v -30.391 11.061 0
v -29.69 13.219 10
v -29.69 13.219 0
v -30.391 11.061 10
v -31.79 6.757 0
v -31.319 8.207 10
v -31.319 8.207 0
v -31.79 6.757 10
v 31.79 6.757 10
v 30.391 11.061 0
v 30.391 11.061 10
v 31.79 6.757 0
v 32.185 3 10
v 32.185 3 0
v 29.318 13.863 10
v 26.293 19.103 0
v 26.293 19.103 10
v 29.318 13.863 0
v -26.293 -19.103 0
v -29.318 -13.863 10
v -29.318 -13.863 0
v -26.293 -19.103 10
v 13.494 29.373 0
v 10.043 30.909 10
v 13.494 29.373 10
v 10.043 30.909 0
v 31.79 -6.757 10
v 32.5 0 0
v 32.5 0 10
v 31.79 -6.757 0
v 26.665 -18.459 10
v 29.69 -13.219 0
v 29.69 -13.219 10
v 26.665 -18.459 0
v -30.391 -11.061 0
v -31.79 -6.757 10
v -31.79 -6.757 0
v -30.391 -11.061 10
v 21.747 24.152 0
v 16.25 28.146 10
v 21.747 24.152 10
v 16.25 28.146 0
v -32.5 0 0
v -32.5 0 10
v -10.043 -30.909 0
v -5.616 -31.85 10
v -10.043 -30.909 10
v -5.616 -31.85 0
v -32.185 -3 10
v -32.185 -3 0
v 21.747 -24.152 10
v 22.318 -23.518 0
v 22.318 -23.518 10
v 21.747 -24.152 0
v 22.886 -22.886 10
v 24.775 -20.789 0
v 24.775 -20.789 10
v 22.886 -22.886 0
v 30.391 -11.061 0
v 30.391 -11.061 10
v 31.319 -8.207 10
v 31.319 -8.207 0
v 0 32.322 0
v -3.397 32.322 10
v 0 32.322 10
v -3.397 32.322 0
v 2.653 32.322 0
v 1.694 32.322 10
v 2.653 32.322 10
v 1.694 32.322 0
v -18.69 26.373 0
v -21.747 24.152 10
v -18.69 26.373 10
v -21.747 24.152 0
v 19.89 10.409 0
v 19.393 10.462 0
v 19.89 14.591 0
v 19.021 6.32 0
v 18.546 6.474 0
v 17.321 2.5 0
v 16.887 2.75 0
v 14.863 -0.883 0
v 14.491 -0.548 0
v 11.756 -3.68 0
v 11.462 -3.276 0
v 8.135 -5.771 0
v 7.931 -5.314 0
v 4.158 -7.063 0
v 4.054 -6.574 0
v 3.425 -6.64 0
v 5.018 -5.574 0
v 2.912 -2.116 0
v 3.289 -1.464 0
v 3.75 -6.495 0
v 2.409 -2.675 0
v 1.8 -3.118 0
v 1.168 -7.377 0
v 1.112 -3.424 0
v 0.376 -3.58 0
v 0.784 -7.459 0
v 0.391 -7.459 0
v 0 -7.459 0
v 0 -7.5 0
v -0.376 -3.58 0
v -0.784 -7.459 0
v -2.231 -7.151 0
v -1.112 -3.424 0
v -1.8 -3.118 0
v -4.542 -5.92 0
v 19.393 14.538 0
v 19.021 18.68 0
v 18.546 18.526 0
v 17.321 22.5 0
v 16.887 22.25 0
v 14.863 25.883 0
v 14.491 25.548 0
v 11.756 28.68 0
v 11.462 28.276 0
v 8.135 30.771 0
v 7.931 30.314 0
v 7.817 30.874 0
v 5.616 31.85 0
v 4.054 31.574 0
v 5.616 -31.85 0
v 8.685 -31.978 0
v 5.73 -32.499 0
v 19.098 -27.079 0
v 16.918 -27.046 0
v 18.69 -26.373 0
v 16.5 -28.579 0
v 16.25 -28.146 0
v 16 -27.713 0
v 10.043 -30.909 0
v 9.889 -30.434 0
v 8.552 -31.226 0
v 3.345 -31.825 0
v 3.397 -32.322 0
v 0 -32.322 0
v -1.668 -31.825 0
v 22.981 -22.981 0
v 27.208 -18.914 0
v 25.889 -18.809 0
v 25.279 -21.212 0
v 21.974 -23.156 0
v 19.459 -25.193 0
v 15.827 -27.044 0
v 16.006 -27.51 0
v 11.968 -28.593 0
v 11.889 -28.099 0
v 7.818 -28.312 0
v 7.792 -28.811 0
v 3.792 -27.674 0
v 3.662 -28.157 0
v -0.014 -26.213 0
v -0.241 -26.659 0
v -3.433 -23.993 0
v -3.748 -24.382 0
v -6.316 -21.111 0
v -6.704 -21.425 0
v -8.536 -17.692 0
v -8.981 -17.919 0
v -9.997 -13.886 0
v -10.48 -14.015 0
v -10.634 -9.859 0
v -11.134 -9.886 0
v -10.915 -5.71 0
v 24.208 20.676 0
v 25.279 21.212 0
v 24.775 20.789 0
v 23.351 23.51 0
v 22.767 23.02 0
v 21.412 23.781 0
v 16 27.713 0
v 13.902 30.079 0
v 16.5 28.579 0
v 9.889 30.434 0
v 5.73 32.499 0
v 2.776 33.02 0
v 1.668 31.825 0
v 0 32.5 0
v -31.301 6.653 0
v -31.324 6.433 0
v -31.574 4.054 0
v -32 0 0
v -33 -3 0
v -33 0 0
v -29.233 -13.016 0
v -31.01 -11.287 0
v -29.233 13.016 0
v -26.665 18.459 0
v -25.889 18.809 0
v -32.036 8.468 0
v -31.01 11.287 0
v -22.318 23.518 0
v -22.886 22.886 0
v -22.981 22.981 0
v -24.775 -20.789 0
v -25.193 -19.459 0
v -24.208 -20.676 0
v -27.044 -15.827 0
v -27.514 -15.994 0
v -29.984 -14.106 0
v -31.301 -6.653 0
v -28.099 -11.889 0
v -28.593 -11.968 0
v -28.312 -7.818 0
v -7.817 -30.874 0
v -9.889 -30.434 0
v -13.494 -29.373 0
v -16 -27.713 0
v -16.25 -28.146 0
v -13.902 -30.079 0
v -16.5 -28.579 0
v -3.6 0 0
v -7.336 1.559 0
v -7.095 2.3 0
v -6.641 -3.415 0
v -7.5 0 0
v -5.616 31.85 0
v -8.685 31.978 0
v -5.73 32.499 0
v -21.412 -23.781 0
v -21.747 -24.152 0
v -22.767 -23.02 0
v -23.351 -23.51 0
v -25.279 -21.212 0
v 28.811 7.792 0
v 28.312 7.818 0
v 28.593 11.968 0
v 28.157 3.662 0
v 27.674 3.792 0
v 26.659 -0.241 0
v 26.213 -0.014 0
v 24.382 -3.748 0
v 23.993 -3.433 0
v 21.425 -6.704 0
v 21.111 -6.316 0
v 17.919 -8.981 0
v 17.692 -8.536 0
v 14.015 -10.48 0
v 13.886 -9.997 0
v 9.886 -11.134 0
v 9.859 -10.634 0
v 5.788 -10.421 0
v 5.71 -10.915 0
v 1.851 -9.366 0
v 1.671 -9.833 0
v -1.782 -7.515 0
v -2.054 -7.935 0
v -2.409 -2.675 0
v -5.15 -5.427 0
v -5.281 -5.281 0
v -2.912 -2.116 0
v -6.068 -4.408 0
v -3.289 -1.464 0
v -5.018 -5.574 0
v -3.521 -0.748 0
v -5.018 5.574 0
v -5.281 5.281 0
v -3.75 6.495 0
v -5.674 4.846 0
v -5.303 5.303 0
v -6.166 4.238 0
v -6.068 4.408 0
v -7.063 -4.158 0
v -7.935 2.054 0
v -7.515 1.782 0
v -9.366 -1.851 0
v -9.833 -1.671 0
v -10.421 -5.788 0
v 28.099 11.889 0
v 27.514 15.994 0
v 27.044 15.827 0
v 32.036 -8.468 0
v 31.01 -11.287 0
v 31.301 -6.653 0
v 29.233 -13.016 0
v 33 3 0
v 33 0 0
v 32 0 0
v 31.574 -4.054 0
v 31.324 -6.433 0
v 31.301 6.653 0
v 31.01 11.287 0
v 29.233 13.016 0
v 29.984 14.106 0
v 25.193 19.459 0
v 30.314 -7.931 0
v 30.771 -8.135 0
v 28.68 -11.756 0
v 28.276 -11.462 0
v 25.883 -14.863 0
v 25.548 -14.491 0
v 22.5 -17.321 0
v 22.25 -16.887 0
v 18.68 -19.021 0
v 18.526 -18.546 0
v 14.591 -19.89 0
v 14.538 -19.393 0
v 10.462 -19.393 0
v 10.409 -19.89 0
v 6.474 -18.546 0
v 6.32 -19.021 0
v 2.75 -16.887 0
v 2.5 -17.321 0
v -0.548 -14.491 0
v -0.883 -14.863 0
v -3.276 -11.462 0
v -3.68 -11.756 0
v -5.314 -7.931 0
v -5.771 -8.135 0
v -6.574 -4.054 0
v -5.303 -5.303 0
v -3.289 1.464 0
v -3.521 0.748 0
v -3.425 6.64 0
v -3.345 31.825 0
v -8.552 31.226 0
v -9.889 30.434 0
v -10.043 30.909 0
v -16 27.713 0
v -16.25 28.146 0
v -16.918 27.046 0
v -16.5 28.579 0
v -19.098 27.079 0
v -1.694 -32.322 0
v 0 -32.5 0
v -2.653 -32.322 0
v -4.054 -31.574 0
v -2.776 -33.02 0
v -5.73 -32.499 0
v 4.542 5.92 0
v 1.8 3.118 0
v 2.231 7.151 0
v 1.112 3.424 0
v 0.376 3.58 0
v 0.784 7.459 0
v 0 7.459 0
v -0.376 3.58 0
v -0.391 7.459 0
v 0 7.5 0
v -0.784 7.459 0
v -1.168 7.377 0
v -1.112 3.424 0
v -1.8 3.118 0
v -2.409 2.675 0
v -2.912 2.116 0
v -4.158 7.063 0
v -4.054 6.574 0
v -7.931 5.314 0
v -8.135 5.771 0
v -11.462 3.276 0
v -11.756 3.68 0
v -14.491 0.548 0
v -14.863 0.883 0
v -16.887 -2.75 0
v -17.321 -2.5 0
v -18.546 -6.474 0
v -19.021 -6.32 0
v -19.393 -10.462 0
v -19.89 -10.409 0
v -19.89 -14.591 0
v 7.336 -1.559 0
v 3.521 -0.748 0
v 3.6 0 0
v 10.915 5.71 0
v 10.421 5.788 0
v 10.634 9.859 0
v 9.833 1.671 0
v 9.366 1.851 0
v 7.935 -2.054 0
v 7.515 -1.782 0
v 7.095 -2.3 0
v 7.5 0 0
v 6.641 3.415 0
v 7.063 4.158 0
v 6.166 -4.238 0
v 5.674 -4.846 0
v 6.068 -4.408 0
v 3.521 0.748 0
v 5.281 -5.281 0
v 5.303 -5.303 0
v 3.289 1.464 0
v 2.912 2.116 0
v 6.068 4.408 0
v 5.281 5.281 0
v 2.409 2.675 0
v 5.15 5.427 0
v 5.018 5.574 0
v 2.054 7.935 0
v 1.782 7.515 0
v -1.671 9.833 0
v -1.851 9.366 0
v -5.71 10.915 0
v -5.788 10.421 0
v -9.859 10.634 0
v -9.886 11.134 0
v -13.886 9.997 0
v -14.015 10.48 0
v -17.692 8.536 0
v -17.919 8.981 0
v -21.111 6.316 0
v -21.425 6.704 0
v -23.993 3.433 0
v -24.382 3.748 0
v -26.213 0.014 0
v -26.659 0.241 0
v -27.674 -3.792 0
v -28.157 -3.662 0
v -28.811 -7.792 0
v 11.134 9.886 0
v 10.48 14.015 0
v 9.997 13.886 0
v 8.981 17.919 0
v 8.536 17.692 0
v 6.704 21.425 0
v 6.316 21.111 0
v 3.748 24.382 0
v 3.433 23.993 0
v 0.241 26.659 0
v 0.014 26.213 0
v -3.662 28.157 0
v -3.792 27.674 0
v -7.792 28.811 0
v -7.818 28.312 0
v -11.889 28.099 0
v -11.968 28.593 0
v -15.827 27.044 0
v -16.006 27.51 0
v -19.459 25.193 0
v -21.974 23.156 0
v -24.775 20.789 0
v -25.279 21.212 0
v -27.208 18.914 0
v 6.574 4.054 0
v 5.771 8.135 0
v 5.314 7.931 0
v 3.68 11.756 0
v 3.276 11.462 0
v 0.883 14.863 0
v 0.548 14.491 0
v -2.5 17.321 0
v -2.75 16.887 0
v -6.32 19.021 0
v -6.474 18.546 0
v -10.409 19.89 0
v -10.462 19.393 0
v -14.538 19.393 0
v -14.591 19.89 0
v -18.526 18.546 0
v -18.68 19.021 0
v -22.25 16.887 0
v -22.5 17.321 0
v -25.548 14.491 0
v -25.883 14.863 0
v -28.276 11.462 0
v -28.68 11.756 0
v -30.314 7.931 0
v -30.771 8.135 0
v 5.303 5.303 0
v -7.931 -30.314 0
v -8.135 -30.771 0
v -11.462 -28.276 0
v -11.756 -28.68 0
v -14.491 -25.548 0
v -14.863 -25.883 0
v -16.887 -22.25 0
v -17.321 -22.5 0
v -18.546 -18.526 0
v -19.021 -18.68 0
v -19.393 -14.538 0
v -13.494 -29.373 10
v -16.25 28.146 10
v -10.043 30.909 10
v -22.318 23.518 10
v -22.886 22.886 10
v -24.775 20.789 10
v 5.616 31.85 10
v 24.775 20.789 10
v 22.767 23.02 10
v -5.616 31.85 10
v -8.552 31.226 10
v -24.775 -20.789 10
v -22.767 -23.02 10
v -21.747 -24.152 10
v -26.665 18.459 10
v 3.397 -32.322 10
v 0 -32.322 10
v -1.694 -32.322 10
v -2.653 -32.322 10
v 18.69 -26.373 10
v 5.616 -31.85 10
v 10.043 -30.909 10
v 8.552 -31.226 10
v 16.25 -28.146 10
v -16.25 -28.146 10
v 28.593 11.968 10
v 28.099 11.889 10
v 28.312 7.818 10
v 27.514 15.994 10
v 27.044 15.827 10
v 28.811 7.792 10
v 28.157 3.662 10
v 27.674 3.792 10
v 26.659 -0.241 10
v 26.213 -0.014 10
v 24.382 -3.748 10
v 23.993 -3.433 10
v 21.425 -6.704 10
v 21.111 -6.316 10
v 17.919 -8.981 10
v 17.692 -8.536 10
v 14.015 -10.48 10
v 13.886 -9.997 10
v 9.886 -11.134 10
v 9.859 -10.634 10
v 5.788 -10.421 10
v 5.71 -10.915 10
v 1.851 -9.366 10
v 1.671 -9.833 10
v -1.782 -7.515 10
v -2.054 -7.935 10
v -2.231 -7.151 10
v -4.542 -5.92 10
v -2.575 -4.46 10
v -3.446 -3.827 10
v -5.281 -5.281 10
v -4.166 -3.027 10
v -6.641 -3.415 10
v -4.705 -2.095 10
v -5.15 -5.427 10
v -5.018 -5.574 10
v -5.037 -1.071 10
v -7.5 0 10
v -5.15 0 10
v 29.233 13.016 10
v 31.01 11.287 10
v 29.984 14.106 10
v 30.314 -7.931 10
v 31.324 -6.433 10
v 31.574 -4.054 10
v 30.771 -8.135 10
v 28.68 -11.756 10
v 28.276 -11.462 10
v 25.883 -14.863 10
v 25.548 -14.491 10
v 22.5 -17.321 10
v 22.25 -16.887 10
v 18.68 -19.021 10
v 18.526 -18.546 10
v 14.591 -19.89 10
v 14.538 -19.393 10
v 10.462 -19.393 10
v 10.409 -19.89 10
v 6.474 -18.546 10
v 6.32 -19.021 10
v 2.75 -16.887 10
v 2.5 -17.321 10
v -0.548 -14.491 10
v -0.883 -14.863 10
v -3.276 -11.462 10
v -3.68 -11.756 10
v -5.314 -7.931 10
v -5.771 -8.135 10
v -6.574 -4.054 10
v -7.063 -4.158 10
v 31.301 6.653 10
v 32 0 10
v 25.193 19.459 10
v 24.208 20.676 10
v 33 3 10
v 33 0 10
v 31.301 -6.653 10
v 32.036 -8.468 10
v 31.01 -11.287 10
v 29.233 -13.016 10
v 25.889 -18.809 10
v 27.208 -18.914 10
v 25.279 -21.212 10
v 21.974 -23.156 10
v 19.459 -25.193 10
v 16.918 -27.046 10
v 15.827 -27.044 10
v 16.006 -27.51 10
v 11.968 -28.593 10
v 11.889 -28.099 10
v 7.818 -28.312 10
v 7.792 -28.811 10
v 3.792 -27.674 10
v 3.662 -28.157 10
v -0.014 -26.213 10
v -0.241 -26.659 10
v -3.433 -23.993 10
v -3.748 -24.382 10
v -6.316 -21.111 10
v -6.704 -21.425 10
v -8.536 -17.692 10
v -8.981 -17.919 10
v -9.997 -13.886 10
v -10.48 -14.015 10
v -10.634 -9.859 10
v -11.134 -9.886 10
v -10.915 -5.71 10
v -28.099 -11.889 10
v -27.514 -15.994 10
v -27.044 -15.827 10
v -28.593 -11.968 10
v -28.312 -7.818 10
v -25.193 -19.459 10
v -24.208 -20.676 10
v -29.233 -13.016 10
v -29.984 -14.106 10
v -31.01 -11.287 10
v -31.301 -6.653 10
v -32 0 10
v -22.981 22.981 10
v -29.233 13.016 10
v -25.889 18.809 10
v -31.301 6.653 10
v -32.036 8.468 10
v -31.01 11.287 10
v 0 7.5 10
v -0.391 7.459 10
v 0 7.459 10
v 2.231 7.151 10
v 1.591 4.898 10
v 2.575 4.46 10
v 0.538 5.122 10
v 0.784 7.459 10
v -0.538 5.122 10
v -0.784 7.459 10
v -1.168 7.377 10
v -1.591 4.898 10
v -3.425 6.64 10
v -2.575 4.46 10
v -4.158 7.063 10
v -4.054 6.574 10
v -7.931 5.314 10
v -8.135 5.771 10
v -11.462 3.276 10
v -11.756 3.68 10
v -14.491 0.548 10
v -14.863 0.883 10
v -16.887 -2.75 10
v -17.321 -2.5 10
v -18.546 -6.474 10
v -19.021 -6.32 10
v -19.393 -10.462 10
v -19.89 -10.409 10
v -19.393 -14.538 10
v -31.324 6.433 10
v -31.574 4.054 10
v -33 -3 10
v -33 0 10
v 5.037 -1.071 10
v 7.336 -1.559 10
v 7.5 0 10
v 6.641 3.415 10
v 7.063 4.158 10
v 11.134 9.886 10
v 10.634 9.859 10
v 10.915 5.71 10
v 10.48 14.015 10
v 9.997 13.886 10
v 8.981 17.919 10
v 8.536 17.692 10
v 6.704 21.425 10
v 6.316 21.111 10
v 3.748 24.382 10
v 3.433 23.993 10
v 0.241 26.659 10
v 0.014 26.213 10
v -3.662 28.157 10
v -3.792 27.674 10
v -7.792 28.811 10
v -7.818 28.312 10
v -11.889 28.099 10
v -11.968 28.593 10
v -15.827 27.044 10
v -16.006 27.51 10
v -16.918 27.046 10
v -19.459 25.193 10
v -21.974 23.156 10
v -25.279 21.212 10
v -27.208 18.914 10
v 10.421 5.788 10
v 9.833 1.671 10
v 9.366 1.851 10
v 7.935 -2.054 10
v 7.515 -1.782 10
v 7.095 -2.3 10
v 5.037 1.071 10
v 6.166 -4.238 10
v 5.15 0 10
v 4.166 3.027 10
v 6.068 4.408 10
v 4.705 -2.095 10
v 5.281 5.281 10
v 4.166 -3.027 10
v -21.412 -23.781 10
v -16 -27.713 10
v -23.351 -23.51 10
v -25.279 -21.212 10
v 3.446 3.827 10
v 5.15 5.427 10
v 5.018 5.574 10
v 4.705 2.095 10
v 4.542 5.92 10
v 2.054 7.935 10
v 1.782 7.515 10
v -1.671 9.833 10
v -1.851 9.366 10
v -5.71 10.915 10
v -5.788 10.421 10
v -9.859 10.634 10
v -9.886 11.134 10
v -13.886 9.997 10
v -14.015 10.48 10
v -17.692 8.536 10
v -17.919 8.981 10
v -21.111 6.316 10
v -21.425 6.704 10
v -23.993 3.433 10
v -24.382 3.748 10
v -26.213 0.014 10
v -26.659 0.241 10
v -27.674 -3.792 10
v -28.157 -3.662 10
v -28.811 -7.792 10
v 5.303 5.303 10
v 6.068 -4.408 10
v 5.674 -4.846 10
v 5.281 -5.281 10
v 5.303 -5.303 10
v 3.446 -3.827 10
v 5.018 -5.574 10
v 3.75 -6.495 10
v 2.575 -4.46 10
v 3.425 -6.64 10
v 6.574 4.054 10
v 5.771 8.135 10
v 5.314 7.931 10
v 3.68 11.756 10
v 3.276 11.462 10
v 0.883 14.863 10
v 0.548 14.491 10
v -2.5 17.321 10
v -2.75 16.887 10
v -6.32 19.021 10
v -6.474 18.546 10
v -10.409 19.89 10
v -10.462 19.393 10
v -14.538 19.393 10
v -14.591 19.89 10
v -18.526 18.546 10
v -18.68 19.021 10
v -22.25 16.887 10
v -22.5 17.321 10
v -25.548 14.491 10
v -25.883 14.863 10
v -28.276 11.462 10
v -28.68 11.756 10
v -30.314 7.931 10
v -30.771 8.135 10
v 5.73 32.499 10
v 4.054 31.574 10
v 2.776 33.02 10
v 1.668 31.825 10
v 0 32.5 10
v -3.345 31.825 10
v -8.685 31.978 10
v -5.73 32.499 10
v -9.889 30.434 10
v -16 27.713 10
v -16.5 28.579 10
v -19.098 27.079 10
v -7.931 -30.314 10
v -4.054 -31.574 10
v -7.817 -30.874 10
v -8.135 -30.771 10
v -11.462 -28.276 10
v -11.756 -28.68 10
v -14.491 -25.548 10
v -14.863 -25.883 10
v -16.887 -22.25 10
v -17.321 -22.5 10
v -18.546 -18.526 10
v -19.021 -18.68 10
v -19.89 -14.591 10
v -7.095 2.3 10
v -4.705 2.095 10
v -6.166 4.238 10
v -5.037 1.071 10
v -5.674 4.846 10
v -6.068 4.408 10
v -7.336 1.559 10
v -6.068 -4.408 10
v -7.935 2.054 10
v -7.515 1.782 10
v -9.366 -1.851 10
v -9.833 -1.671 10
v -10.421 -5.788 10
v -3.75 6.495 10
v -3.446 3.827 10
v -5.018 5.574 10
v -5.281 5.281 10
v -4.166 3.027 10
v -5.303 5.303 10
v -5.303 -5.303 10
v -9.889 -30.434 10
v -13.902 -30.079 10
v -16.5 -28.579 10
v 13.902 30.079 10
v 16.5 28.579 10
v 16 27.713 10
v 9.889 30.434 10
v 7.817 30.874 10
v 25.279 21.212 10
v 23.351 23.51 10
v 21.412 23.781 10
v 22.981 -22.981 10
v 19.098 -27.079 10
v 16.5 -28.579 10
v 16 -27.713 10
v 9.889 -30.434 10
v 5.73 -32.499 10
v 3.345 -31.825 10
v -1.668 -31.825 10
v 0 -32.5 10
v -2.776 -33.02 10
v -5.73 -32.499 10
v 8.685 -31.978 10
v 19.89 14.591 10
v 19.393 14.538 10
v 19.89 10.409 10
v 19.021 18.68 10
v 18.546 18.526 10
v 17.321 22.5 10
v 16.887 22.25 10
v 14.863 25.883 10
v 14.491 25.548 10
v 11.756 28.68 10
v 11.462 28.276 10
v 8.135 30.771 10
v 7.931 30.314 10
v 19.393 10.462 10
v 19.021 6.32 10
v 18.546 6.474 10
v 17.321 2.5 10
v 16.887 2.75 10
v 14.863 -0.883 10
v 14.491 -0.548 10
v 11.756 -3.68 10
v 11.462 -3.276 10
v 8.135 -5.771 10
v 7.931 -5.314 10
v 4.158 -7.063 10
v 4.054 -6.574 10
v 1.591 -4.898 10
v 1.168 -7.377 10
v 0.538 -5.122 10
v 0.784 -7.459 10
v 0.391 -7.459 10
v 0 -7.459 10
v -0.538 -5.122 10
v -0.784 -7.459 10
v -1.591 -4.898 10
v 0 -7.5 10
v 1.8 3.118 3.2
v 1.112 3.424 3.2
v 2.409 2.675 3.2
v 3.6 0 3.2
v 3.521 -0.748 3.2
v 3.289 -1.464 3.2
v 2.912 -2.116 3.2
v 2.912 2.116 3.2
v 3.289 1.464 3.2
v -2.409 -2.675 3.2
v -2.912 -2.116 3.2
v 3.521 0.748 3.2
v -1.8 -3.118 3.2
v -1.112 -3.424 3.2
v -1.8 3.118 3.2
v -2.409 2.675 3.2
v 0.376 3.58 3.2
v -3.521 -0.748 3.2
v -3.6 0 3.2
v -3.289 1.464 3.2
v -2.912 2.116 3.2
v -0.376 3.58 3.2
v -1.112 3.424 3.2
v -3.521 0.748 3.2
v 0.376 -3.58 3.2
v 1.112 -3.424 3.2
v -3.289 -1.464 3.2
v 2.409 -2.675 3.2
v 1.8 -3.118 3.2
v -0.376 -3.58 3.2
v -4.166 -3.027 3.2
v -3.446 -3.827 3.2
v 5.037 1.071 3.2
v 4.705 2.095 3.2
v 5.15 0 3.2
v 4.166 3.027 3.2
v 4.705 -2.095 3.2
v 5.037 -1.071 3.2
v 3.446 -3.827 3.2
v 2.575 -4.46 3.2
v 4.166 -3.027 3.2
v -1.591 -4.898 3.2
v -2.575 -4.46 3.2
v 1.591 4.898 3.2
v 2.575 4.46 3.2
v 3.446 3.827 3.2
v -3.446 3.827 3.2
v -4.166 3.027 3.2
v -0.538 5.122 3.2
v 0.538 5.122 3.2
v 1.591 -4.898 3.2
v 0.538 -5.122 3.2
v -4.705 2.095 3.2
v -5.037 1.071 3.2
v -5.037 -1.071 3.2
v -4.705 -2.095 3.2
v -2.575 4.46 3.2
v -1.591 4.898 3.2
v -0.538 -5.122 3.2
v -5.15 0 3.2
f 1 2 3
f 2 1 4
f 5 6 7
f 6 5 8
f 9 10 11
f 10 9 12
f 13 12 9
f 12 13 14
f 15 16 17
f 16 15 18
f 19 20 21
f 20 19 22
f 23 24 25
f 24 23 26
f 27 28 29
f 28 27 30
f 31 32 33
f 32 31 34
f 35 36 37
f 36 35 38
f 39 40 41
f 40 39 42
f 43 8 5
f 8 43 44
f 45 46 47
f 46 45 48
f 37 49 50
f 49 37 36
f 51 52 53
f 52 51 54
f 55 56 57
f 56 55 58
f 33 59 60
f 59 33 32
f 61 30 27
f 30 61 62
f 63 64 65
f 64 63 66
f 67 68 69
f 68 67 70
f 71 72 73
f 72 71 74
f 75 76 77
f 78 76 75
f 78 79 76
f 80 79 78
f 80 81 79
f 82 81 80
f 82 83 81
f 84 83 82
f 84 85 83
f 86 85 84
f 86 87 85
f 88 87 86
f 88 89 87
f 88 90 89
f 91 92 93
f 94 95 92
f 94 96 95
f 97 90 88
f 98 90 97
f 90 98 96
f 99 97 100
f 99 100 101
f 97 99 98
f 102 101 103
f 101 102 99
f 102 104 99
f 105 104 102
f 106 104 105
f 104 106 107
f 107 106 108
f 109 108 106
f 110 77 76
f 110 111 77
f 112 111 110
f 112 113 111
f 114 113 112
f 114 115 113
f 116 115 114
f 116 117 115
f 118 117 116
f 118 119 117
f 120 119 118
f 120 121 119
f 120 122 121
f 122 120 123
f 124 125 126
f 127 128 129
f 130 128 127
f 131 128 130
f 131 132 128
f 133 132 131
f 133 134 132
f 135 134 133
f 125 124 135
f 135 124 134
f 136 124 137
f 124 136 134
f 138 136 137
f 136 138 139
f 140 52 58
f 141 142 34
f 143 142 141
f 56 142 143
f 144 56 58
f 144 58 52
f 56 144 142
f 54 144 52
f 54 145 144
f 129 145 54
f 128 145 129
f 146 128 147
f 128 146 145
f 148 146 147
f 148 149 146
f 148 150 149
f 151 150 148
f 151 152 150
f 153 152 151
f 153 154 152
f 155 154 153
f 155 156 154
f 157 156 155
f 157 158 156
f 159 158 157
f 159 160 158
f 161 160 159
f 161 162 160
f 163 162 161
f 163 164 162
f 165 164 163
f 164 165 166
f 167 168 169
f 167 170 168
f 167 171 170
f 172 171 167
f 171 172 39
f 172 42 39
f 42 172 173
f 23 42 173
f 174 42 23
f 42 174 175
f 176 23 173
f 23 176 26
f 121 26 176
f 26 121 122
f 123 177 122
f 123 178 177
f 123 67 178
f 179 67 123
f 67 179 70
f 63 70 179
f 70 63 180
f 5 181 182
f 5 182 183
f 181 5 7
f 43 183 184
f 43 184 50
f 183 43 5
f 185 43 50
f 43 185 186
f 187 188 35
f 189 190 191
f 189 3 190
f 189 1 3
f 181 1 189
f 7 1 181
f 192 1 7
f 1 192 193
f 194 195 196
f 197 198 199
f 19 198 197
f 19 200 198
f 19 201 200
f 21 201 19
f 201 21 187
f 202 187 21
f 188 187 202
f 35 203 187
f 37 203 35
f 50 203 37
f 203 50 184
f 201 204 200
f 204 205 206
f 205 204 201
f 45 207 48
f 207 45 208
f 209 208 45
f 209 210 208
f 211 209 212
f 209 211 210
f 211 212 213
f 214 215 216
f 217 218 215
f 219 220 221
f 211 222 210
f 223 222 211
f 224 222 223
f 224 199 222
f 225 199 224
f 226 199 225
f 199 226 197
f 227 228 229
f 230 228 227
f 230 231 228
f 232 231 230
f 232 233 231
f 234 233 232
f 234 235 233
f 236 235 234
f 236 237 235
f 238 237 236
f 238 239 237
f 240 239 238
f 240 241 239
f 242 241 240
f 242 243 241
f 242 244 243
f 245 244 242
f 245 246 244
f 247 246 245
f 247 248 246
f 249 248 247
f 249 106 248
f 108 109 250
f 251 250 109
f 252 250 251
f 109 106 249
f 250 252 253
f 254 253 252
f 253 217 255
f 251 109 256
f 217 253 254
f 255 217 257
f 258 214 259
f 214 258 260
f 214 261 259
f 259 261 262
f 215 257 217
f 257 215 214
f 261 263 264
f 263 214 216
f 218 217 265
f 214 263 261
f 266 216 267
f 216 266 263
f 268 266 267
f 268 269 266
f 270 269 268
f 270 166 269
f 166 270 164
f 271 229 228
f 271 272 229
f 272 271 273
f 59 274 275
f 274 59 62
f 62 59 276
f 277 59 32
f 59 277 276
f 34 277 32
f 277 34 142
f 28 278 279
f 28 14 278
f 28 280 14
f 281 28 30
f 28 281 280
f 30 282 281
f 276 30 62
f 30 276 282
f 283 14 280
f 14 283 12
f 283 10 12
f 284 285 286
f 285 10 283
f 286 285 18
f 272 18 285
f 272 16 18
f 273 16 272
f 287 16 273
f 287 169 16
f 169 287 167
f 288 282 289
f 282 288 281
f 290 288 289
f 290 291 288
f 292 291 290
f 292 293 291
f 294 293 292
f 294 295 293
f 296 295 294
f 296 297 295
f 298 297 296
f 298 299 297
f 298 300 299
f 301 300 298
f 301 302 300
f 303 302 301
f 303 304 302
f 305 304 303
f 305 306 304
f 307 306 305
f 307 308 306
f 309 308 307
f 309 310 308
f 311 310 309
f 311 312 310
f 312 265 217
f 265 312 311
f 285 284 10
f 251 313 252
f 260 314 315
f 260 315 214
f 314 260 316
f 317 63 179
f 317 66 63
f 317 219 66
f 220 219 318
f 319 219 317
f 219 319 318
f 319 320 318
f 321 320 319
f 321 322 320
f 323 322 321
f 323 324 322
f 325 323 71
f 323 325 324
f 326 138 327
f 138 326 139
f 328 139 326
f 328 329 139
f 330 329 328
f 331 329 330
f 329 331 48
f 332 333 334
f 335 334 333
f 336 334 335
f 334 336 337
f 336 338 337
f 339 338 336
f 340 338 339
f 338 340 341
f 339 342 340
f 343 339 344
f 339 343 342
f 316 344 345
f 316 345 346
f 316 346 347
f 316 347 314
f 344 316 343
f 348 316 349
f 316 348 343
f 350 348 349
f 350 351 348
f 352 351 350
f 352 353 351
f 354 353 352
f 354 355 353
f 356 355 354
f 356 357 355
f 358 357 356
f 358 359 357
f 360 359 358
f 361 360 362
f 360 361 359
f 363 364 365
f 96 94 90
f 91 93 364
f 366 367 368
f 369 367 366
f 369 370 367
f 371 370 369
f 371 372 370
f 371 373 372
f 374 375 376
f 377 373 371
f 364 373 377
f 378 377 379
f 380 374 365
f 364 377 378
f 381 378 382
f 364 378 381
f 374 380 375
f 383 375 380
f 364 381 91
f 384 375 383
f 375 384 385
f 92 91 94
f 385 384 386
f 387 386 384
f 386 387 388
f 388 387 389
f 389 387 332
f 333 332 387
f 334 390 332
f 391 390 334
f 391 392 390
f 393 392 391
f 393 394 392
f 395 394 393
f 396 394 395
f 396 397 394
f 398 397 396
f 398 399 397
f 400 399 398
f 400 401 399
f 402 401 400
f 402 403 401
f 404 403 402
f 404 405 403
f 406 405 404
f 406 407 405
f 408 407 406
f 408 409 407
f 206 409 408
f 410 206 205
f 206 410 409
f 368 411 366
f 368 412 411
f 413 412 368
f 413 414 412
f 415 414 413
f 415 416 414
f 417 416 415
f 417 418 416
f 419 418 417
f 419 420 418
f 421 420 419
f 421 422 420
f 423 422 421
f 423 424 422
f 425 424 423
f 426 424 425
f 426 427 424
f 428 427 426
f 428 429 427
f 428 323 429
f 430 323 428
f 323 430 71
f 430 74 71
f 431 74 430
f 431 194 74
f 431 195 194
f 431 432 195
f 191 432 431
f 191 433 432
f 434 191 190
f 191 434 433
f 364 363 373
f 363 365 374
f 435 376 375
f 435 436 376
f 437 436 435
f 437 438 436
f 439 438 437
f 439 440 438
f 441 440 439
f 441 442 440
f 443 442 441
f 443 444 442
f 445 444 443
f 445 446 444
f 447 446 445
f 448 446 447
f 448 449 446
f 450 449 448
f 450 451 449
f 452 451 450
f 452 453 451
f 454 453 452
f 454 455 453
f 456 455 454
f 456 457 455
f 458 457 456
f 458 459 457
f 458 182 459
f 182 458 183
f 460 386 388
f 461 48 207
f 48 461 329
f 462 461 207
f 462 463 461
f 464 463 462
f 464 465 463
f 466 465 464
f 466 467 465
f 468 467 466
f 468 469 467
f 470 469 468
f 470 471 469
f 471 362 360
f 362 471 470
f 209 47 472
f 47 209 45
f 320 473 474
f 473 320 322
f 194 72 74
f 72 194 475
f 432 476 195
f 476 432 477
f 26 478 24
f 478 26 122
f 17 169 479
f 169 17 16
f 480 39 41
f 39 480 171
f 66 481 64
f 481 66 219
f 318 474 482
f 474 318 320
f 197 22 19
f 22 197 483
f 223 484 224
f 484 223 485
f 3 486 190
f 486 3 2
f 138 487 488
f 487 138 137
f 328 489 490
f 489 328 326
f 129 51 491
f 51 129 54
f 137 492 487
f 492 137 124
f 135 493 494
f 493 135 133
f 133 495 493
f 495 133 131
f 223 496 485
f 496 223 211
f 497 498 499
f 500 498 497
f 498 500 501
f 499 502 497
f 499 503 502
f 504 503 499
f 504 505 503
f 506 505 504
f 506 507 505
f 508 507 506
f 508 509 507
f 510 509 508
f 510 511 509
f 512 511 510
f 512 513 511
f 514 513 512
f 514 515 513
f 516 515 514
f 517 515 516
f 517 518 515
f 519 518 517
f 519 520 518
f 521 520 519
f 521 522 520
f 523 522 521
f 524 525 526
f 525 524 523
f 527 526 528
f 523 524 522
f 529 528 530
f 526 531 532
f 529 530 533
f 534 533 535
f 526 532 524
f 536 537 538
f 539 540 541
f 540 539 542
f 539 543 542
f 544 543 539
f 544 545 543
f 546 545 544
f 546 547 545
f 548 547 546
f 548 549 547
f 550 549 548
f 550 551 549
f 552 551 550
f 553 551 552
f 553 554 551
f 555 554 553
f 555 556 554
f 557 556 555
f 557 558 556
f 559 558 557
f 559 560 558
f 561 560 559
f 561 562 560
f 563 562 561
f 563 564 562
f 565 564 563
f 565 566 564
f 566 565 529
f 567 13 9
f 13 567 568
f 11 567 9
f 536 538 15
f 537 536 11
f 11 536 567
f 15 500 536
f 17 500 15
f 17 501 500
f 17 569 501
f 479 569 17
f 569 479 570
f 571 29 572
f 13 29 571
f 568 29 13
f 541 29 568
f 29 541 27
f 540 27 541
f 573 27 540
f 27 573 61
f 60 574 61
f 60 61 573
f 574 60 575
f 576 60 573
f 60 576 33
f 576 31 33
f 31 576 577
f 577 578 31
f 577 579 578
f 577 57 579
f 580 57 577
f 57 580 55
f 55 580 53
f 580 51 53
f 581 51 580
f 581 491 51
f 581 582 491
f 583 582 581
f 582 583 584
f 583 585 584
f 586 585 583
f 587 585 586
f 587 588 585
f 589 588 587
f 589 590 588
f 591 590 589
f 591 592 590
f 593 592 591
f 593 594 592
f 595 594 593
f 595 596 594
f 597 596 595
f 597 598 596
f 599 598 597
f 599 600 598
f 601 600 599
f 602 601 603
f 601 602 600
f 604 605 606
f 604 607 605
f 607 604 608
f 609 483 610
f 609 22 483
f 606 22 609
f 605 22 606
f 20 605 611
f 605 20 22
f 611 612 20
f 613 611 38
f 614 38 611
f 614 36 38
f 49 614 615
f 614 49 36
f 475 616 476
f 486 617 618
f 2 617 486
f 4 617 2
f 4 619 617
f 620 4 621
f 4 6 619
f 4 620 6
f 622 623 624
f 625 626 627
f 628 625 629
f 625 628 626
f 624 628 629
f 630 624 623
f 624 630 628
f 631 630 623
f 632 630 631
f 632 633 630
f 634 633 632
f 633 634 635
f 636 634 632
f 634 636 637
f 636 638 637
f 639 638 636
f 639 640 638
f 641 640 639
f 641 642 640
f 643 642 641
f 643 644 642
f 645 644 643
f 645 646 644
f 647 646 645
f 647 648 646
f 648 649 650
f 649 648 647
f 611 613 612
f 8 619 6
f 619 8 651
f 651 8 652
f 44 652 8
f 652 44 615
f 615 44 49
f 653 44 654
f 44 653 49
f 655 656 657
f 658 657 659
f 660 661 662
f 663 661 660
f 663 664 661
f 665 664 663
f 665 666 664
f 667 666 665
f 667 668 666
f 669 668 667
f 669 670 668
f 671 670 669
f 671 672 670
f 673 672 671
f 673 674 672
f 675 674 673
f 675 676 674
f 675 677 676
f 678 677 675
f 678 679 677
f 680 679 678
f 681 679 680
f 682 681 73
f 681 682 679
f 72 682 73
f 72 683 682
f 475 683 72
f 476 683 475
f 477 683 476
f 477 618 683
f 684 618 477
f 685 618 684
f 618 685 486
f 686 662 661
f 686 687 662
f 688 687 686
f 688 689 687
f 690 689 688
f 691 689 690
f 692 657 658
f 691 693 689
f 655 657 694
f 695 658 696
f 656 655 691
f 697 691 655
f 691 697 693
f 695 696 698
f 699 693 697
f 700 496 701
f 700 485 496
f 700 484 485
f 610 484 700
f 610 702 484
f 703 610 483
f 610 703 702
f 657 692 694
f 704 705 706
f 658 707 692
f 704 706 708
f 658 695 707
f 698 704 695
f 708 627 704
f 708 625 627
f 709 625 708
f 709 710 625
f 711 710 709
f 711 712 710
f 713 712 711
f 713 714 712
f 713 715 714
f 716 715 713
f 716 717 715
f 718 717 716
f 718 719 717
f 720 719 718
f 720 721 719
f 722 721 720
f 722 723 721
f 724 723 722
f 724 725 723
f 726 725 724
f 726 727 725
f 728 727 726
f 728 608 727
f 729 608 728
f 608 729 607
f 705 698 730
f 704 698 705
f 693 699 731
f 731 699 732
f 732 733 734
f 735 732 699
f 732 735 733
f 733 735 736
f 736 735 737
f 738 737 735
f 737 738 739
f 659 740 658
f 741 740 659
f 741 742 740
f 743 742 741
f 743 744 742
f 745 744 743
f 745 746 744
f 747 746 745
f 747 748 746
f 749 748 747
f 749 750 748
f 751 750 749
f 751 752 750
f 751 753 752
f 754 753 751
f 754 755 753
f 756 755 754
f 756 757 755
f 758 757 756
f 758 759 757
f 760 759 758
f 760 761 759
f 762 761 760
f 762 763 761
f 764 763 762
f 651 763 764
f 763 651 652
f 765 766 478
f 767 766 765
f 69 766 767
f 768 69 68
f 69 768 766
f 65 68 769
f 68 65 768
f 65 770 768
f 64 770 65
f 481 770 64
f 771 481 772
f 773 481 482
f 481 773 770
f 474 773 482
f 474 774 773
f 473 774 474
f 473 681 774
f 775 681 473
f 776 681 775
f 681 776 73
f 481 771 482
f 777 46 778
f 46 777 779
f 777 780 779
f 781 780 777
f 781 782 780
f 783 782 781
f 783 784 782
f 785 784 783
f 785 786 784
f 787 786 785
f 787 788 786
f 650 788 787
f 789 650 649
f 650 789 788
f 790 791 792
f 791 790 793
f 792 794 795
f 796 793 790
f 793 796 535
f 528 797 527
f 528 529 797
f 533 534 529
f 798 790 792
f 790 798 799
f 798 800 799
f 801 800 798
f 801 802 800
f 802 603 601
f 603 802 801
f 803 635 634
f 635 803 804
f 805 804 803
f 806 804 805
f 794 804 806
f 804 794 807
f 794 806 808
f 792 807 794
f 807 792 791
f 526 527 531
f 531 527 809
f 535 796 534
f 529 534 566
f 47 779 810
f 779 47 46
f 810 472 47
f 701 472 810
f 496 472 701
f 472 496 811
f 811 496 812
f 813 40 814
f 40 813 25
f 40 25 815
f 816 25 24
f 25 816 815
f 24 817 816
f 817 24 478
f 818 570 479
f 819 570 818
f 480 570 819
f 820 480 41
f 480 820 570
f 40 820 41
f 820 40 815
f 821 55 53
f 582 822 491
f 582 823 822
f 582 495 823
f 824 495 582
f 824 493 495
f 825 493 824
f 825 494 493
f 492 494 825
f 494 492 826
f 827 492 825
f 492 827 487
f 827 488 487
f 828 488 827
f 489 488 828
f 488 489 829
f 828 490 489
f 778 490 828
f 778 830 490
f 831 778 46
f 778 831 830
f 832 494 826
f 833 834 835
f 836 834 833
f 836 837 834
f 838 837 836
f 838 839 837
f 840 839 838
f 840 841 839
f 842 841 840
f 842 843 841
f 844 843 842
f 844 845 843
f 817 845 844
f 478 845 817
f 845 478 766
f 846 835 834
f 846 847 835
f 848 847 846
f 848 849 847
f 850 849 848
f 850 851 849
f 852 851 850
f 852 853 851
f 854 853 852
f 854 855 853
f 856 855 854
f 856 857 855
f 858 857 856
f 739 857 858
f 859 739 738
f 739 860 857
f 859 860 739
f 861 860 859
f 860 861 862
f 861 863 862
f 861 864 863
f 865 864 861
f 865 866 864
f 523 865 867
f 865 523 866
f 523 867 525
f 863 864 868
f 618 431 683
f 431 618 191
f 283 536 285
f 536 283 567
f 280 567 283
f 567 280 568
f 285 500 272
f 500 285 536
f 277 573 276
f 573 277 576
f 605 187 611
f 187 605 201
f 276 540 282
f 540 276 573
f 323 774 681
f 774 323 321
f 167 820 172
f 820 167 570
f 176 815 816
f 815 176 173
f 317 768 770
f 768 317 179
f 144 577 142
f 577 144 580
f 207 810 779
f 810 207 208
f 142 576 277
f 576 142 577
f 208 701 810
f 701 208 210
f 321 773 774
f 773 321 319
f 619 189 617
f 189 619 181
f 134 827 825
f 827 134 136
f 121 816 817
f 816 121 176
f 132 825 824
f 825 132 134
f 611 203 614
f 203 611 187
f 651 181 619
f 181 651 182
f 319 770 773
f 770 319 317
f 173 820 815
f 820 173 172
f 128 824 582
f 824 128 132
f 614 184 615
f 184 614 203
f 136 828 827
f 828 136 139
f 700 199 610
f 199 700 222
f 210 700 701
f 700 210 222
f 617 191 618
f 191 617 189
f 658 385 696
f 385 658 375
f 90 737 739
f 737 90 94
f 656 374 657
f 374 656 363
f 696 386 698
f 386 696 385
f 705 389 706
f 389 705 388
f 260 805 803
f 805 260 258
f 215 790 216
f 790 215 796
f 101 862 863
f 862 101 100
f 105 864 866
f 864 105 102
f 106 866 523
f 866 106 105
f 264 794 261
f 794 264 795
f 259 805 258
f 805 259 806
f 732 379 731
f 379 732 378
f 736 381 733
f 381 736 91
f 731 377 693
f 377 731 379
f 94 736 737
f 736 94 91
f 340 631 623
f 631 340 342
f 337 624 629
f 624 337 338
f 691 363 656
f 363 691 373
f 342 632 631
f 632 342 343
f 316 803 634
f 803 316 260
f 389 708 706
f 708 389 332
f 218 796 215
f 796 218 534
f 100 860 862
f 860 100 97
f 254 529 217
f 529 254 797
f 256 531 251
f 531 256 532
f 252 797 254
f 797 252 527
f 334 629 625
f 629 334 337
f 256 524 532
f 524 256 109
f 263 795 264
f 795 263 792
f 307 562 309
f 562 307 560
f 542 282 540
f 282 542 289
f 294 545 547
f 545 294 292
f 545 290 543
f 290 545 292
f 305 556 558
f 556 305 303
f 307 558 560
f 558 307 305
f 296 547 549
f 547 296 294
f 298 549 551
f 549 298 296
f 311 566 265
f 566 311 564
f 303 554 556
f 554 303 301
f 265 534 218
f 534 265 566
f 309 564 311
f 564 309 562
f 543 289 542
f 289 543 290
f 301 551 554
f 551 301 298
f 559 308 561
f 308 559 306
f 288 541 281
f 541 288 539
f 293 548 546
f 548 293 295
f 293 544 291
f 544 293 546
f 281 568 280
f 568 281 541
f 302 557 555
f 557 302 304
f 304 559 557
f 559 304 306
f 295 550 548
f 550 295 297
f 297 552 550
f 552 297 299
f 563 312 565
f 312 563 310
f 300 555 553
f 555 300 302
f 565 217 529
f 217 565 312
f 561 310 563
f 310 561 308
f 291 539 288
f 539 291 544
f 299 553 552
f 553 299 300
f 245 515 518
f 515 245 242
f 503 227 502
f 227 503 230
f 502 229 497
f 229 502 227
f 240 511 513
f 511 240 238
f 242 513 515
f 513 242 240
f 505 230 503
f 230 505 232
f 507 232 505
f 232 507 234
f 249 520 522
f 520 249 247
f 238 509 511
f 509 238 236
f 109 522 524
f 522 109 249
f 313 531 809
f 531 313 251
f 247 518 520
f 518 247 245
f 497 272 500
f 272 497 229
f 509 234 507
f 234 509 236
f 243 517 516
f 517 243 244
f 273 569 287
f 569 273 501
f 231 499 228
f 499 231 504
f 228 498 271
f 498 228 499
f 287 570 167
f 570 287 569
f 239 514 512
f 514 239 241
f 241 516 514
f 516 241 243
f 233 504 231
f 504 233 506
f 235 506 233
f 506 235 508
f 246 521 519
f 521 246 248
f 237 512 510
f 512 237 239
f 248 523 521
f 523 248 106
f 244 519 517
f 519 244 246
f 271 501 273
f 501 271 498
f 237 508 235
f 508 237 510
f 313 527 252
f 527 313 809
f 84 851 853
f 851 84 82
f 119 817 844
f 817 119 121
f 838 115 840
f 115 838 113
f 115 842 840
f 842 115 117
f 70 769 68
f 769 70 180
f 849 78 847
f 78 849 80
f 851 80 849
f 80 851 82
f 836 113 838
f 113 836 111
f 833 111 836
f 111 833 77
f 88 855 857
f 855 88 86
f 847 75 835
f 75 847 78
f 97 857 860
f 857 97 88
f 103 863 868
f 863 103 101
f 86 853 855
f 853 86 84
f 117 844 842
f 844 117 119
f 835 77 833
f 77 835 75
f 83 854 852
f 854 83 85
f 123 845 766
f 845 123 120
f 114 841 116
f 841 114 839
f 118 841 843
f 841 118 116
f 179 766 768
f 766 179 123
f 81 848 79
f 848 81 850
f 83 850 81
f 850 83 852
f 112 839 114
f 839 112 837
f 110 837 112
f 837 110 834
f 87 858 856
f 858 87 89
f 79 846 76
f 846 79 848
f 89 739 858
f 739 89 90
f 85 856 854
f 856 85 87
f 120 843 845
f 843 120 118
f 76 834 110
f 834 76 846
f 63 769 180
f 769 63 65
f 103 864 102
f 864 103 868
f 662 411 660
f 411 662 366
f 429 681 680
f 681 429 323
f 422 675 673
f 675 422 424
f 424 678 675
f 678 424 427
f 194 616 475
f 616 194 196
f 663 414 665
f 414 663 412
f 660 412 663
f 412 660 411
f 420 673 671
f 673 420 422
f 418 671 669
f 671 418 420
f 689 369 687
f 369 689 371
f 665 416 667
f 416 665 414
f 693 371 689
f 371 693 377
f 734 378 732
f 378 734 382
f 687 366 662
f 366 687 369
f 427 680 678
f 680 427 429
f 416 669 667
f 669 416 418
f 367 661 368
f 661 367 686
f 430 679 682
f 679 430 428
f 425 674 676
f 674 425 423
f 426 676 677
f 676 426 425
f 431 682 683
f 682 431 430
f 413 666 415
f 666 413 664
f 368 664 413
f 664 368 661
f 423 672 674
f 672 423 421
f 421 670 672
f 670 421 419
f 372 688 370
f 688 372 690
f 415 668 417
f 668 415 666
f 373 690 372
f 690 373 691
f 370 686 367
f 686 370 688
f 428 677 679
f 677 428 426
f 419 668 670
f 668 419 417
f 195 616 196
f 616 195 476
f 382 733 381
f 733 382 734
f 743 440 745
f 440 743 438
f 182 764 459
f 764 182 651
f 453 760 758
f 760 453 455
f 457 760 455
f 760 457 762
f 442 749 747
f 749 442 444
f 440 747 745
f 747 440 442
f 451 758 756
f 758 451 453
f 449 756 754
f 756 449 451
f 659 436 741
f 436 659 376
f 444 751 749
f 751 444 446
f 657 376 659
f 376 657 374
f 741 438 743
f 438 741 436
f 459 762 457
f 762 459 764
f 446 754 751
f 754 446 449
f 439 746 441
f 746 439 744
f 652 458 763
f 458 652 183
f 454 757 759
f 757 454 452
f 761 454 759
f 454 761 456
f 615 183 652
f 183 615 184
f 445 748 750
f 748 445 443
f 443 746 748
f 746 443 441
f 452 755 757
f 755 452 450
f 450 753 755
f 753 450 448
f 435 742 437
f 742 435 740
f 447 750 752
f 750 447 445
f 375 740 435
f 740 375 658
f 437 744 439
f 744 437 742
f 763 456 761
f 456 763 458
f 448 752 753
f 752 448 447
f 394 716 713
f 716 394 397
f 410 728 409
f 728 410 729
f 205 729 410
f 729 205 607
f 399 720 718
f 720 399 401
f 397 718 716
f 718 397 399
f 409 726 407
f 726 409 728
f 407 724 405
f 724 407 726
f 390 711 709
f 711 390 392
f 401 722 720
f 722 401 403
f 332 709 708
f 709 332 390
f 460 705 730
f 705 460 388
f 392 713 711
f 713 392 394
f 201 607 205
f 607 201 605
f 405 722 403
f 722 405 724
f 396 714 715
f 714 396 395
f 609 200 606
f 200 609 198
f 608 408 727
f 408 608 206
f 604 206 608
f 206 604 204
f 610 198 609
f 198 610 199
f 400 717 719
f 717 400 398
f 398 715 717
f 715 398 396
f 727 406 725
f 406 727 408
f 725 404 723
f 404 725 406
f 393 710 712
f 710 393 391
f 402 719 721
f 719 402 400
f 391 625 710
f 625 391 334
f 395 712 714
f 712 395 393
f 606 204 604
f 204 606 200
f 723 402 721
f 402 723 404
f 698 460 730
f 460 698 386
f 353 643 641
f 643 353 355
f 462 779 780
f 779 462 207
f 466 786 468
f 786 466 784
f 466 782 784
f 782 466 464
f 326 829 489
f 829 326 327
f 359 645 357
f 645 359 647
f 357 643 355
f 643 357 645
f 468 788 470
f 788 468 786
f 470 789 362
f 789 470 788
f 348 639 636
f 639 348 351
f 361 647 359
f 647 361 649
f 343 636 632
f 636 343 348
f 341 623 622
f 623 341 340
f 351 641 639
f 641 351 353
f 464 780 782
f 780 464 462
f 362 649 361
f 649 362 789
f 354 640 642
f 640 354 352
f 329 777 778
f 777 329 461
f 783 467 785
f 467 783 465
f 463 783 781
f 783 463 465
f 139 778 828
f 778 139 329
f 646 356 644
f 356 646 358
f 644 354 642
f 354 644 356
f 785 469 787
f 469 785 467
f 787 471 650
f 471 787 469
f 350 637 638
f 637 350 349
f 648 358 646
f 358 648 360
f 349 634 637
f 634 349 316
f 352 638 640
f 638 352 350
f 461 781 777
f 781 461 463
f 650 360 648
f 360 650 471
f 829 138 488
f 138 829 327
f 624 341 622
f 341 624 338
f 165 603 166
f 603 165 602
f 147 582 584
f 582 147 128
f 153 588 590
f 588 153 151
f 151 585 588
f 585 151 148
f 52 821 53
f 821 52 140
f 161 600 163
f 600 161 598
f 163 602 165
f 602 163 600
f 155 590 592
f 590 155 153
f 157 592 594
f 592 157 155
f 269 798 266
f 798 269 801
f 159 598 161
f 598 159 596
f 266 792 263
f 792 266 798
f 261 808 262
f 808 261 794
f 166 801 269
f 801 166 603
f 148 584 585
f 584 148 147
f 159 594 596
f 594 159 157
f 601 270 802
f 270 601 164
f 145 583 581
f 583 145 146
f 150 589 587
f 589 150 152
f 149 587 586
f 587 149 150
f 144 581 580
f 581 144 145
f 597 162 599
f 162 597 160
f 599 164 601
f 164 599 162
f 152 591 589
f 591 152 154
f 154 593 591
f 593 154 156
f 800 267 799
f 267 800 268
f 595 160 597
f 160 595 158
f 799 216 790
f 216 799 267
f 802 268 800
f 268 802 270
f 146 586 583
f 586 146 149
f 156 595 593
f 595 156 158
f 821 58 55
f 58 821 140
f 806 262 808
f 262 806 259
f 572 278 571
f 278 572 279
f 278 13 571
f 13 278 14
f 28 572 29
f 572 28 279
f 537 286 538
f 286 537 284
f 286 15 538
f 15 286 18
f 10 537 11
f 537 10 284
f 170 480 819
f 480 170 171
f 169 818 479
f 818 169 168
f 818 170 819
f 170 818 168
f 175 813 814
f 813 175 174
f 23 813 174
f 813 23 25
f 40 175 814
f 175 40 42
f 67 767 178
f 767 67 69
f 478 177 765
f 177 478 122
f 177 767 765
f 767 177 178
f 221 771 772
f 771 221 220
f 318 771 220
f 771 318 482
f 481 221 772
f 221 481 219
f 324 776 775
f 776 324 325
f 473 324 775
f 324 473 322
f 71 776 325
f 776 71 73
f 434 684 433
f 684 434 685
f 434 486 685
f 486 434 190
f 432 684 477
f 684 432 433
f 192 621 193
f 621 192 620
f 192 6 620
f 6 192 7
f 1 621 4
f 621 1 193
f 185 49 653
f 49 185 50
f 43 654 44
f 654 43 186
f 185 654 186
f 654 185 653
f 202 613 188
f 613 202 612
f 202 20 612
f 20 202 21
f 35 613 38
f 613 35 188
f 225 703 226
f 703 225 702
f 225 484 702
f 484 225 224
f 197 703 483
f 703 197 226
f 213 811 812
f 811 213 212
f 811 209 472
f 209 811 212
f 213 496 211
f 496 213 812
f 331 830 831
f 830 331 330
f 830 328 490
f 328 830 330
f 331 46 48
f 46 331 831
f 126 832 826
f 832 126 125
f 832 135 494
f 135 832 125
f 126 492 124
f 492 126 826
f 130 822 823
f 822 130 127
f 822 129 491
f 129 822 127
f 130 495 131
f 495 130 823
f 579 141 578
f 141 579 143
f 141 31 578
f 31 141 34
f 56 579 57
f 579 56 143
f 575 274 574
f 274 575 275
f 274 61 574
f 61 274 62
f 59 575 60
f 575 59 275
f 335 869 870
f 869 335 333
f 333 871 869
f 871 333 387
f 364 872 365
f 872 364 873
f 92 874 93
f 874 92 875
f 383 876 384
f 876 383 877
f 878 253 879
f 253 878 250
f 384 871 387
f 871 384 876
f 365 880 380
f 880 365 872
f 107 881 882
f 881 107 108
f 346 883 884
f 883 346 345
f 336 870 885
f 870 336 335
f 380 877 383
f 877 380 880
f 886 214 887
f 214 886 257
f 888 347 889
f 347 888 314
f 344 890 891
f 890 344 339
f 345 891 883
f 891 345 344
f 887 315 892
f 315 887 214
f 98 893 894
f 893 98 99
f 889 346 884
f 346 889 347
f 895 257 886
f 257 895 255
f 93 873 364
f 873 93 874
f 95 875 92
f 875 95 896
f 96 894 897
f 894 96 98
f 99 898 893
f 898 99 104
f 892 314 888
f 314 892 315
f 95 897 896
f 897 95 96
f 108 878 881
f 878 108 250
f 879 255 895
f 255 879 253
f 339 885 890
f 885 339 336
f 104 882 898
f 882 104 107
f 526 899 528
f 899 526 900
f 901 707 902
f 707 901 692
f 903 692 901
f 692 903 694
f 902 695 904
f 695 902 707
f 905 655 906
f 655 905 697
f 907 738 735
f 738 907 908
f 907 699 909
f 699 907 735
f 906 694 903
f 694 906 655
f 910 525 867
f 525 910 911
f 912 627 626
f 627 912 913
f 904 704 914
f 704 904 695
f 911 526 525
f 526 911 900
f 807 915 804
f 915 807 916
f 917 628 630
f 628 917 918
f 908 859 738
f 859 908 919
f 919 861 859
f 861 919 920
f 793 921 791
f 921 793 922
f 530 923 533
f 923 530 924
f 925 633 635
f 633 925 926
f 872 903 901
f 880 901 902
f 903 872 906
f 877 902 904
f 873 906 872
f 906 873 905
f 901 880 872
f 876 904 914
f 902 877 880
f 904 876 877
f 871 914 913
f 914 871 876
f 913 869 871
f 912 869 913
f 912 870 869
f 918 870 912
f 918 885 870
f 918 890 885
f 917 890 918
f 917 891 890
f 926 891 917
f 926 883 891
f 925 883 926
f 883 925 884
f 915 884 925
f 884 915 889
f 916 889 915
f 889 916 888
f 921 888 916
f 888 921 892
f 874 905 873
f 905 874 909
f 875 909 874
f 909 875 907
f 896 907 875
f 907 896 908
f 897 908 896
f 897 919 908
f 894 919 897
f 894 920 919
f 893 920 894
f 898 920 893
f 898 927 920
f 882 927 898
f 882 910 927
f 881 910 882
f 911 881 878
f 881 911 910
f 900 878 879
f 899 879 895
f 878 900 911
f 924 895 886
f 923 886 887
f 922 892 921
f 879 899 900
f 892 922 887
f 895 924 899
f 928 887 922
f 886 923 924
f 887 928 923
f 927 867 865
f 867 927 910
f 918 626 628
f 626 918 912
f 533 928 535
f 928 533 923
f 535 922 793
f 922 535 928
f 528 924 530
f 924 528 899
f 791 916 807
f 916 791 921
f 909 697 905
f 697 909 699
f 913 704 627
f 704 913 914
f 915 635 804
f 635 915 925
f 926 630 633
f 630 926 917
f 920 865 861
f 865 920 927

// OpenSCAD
/*   	Parametric airlehttps://news.google.com/?tab=wn&hl=fr&gl=FR&ceid=FR:frhttps://news.google.com/?tab=wn&hl=fr&gl=FR&ceid=FR:frss tire
		by Travis Howse <tjhowse@gmail.com>
		2012.   License, GPL v2 or later
**************************************************/
// https://www.thingiverse.com/thing:17514/files
dia_in = 1;
dia_out = 65;// Default 40
spoke_count = 8; // Default 4
spoke_thickness = 0.5; //Default 0.5
tread_thickness = 0.5; //Default 0.5
hub_thickness = 7;
height = 10;
$fn = 30;
spoke_dia = (dia_in/2) + hub_thickness + (dia_out/2) - tread_thickness+spoke_thickness;
grip_density = 0.05;//0.05; // Set to 0 for no grip.
grip_height = 1.;
grip_depth = 3;
pi = 3.14159;
zff = 0.001;
print_wheel = true;
print_washer = false;

//Set to 1 for a double spiral.
// Note: single-wall spokes probably won't work with double spirals, as the
// first layer of the upper spiral would bridge in a straight line, rather
// than a curve. Successive layers probably wouldn't recover.
double_spiral = 0;

module wheel()
{
	difference()
	{
		cylinder(r=dia_out/2,h=height);
		cylinder(r=(dia_out/2)-tread_thickness,h=height);	
	}

	difference()
	{
		cylinder(r=(dia_in/2)+hub_thickness,h=height);
		cylinder(r=dia_in/2,h=height);	
	}

	for (i = [0:spoke_count-1])
	{
		if (double_spiral)
		{
			rotate([0,0,i * (360/spoke_count)]) translate([(spoke_dia/2)-(dia_in/2)-hub_thickness,0,(height/2)+zff]) spoke();
			rotate([180,0,i * (360/spoke_count)]) translate([(spoke_dia/2)-(dia_in/2)-hub_thickness,0,-height/2]) spoke();			
		} else {
			rotate([0,0,i * (360/spoke_count)]) translate([(spoke_dia/2)-(dia_in/2)-hub_thickness,0,0]) spoke();
		}
	}
	
	if (grip_density != 0)
	{
		for (i = [0:(360*grip_density)])
		{
			rotate([0,0,i*(360/(360*grip_density))]) translate([dia_out/2-grip_height/2,0,0]) cube([grip_height,grip_depth,height]);
		}
	}
}

module spoke()
{
	intersection()
	{
		difference()
		{
			cylinder(r=spoke_dia/2,h=height);
			cylinder(r=(spoke_dia/2)-spoke_thickness,h=height);	
		}
		if (double_spiral)
		{
			translate([-spoke_dia/2,-spoke_dia,0]) cube([spoke_dia,spoke_dia,height/2]);
		} else {
			translate([-spoke_dia/2,-spoke_dia,0]) cube([spoke_dia,spoke_dia,height]);
		}
	}
}

if (print_wheel) {
    mirror([0,0,1]) {
        translate([0,0,-height]) {
            difference() {
                wheel();
                
                // Center of the wheel
                cylinder(h=height, r1=3.6, r2=3.6, center=false);
                cylinder(h=height - 3.2, r=5.15, center=false);
            }
        }
    }
    
}

//Washer
if (print_washer) {
    translate([0,dia_out/2 + 15,0]) {
        
        difference() {
            // Center of the wheel
            cylinder(h=1.5, r1=hub_thickness, r2=hub_thickness, center=false);
            cylinder(h=1.5, r=3.6, center=false);
        }

    }    
}
